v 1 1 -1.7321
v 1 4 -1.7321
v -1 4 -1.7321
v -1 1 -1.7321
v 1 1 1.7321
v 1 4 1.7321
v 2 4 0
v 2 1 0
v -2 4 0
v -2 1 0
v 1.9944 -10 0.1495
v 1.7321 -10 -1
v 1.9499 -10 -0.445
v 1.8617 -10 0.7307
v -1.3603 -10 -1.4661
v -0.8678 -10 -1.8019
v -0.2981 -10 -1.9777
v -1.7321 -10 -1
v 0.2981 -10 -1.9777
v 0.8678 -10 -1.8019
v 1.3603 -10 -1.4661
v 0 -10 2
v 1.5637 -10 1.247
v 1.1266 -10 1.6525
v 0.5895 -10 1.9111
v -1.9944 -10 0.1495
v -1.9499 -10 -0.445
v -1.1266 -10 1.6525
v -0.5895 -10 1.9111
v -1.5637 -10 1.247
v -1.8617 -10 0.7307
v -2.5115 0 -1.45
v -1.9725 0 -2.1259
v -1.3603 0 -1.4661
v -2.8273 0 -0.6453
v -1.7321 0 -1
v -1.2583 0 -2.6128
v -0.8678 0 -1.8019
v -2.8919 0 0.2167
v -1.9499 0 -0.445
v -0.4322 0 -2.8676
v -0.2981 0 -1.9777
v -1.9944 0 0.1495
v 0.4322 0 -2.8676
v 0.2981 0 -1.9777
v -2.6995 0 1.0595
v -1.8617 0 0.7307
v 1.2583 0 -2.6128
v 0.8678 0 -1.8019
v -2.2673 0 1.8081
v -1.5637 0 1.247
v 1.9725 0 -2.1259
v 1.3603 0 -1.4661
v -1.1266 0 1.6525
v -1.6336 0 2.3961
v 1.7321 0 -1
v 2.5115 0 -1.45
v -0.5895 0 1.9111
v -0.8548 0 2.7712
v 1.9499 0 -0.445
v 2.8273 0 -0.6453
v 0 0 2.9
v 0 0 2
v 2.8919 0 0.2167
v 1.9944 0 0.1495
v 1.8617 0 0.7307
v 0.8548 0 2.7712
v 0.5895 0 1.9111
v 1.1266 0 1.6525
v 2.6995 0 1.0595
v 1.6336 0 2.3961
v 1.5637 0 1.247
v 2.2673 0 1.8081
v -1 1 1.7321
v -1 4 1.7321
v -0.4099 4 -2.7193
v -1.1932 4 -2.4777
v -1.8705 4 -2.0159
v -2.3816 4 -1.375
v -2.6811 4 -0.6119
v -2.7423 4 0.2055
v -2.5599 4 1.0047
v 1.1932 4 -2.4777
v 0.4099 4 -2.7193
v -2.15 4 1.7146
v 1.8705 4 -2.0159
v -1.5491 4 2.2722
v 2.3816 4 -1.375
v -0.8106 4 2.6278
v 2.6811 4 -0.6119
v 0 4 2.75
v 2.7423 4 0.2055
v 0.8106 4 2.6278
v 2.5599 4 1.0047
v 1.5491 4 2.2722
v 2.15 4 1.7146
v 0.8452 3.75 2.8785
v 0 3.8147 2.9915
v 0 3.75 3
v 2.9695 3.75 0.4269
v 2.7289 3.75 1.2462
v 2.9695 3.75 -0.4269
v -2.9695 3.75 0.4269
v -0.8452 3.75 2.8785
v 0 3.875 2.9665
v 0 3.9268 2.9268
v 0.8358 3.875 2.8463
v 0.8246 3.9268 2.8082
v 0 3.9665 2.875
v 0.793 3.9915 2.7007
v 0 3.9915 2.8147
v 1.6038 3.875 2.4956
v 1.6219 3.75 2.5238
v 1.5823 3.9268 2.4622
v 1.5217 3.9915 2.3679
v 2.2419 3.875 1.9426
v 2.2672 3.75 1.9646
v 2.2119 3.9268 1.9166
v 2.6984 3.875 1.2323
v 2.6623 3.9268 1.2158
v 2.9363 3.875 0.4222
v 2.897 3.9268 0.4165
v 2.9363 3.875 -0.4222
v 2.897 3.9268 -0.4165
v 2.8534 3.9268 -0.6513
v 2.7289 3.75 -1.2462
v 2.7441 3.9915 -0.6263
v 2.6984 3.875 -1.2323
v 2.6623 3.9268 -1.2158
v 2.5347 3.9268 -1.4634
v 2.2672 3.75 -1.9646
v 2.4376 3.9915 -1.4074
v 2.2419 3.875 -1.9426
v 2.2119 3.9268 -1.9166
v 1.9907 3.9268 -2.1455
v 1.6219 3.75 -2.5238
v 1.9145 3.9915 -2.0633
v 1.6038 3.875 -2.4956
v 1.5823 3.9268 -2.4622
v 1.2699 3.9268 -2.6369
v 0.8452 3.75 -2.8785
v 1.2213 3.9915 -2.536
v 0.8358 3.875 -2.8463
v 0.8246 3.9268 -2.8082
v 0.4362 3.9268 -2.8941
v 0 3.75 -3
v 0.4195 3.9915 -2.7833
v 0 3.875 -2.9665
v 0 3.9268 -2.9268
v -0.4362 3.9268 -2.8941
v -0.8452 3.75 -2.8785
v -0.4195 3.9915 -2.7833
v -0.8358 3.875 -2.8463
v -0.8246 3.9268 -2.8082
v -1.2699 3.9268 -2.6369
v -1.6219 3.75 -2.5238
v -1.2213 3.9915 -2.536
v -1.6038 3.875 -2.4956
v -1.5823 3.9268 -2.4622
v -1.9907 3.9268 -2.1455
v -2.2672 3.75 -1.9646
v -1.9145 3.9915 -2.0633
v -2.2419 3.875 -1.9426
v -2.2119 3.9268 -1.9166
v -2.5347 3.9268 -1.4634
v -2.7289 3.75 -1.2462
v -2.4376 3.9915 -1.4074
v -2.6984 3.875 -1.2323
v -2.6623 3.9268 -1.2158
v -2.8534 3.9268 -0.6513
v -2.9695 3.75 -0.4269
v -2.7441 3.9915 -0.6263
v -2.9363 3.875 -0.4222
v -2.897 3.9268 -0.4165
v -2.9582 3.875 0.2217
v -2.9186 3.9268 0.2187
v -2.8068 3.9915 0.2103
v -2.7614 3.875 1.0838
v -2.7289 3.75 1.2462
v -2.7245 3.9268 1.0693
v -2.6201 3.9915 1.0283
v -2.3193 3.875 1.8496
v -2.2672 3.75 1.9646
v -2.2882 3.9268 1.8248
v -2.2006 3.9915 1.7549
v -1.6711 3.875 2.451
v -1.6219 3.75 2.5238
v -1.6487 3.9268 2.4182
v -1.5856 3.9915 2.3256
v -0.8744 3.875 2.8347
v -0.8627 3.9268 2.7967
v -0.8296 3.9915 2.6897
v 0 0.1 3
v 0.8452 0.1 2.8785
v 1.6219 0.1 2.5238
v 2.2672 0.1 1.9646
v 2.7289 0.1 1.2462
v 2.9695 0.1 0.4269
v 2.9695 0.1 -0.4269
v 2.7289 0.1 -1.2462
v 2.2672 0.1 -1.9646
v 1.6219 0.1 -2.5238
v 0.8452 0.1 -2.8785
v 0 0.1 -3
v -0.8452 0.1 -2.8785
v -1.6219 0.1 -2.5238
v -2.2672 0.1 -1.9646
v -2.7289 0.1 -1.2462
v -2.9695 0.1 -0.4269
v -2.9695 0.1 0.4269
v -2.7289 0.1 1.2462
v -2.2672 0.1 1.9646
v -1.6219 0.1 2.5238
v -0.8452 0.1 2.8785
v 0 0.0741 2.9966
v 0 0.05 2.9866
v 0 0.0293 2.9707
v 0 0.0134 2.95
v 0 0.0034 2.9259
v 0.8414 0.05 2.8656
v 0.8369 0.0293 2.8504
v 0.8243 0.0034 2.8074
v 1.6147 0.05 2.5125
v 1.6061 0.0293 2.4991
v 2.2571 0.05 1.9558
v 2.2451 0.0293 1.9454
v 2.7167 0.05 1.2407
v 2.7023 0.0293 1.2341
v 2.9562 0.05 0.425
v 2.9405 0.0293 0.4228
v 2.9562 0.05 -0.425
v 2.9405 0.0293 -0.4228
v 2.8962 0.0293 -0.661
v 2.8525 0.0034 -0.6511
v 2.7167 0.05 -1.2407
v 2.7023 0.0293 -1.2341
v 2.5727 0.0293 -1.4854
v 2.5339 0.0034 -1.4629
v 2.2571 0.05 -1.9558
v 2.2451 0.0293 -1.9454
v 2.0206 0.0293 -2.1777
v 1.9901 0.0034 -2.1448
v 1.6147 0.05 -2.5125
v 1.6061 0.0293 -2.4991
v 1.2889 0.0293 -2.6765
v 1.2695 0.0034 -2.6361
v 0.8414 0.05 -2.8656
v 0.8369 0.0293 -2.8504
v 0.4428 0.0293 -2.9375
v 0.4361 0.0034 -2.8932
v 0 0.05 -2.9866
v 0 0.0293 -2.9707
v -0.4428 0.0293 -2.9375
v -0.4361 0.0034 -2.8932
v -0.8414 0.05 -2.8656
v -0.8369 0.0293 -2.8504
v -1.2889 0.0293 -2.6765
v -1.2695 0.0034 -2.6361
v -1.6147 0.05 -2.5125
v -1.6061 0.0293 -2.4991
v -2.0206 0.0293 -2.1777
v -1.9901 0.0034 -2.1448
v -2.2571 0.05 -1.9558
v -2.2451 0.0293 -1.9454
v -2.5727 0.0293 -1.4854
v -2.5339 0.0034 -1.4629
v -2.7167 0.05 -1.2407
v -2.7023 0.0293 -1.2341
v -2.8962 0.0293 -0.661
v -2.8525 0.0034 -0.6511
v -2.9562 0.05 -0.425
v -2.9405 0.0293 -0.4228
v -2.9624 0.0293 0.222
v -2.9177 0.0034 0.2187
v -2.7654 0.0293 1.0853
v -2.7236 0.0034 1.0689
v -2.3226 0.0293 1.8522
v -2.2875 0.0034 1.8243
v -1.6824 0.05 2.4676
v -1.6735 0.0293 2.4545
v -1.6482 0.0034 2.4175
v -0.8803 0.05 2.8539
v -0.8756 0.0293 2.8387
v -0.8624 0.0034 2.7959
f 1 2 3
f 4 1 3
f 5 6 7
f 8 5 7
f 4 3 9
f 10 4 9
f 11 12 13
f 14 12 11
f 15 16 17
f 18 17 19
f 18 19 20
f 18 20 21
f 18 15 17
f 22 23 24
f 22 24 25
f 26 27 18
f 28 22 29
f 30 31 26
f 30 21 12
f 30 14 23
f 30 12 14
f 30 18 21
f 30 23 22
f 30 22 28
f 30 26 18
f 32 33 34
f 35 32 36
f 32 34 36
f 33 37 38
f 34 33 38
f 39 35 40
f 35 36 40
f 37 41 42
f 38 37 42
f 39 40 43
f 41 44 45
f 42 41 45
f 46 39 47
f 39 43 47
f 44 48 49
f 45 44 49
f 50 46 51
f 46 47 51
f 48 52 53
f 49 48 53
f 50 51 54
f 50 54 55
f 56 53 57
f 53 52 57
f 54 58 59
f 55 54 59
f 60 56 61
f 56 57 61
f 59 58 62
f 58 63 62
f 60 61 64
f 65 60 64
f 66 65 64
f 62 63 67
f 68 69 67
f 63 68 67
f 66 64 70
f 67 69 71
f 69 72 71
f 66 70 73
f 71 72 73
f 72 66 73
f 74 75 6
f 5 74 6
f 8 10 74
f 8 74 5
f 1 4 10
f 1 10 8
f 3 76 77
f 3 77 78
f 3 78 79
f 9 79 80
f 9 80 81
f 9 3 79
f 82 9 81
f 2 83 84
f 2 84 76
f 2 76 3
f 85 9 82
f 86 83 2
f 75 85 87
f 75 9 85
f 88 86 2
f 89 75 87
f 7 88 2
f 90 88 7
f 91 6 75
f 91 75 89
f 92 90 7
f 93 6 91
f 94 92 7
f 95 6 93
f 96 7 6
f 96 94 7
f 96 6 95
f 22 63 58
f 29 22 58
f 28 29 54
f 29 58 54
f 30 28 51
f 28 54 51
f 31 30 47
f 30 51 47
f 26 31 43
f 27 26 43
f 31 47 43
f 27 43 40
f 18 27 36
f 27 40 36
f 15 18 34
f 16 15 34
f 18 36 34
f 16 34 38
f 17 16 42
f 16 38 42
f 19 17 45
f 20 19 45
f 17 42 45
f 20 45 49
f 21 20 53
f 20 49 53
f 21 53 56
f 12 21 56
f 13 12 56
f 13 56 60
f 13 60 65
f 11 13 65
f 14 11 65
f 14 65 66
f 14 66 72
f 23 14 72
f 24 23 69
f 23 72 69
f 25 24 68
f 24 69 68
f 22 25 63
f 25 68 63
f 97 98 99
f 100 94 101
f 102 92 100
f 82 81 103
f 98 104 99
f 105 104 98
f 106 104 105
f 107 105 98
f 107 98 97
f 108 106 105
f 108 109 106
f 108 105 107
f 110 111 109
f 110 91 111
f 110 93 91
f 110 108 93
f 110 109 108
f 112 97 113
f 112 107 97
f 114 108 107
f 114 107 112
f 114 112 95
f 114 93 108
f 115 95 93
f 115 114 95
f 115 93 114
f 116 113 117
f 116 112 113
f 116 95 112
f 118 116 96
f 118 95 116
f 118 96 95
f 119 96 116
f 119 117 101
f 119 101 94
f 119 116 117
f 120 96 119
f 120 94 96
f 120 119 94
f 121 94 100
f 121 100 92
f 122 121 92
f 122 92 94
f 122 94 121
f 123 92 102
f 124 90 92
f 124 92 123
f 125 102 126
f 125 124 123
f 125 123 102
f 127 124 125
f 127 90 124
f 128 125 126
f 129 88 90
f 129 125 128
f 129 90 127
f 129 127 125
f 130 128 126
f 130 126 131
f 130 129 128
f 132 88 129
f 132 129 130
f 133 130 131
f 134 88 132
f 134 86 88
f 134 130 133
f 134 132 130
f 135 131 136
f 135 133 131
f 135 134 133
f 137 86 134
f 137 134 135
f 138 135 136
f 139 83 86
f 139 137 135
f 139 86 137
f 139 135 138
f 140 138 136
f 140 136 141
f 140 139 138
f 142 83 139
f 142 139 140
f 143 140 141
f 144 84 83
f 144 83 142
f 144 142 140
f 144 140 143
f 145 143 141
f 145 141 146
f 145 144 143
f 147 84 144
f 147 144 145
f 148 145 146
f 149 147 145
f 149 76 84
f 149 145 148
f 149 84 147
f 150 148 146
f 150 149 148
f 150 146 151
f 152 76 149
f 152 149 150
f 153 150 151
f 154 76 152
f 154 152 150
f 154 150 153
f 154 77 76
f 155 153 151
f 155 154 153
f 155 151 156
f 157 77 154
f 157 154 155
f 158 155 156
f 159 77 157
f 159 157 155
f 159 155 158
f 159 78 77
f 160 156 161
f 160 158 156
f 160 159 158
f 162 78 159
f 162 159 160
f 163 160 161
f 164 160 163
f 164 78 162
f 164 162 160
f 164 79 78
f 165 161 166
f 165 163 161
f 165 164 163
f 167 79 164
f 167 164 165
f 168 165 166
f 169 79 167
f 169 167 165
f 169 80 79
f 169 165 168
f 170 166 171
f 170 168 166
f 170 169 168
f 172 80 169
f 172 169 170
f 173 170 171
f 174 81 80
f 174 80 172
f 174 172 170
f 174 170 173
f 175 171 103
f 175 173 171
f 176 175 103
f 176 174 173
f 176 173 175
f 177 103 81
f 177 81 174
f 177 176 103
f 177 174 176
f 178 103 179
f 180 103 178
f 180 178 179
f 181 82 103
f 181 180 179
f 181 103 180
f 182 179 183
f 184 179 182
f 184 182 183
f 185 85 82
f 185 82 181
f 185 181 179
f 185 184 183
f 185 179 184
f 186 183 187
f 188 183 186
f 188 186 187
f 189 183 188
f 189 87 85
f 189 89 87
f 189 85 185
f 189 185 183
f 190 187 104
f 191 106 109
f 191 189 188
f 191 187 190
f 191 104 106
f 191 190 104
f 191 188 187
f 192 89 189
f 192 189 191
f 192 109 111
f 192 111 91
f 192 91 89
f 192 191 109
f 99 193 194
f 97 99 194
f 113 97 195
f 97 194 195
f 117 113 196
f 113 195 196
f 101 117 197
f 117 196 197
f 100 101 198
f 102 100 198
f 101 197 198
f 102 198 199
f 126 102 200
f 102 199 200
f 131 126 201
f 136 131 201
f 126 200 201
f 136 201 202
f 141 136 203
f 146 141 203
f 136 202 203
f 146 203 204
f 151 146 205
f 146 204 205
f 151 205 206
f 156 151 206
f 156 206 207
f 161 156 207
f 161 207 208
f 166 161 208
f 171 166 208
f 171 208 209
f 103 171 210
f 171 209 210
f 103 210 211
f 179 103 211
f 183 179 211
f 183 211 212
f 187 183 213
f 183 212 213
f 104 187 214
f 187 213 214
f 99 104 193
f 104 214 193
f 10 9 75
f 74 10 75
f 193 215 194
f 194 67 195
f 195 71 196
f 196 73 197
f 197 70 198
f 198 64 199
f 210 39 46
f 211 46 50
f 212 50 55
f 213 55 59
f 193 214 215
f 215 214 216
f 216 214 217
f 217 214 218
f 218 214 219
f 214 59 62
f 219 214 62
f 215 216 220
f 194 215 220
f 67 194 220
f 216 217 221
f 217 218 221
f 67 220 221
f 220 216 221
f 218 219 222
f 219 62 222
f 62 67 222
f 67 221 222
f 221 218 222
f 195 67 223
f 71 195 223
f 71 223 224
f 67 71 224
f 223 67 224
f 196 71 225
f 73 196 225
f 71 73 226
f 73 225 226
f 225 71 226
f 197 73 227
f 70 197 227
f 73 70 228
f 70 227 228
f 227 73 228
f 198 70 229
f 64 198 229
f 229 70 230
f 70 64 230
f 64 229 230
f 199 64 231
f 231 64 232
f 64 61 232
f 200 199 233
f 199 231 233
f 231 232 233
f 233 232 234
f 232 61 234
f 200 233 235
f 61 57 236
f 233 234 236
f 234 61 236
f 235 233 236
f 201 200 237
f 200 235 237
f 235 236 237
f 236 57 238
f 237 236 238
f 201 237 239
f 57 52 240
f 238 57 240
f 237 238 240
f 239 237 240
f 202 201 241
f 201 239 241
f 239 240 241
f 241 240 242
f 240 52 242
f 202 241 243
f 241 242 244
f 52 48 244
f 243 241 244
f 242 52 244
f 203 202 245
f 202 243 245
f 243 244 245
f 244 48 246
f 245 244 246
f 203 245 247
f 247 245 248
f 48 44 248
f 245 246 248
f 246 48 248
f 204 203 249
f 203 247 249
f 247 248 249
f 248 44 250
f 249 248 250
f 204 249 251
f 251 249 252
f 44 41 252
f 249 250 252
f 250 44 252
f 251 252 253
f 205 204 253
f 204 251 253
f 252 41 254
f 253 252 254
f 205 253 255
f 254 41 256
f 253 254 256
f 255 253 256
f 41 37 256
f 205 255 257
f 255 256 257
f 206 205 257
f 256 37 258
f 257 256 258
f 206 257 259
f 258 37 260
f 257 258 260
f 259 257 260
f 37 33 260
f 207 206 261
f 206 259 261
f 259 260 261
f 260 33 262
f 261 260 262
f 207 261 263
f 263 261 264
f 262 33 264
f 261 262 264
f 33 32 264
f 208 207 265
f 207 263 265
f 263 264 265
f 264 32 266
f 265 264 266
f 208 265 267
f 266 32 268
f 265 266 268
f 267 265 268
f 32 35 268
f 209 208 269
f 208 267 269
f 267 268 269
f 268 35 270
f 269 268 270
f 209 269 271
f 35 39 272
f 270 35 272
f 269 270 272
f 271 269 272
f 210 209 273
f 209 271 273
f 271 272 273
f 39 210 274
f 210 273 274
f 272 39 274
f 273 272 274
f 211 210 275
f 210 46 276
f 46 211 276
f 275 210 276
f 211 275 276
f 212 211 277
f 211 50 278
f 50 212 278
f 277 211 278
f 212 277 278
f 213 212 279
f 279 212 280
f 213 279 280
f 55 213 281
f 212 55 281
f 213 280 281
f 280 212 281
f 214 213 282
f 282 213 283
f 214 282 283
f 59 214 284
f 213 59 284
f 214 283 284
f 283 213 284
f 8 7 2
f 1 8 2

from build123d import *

# Parameters (mm, degrees)
SKETCH1_R           = 3
BOSS_EXTRUDE1_DEPTH = 4
FILLET1_R           = 0.25
CUT_EXTRUDE1_DEPTH  = 3
FILLET2_R           = 0.1
SKETCH3_R           = 2
BOSS_EXTRUDE2_DEPTH = 10


with BuildPart() as part:
    # Sketch1 → Boss-Extrude1 (new body)
    with BuildSketch(Plane(origin=(0, 0, 0), x_dir=(1, 0, 0), z_dir=(0, 1, 0))):
        with Locations(Location((0, 0, 0), (0, 0, 270))):
            Circle(SKETCH1_R)
    extrude(amount=BOSS_EXTRUDE1_DEPTH)

    # Fillet1
    fillet1_edges = [part.edges().sort_by_distance(p)[0] for p in [
        (0, 4, -3),
    ]]
    fillet(fillet1_edges, radius=FILLET1_R)

    # Sketch2 → Cut-Extrude1 (cut)
    with BuildSketch(Plane(origin=(0, 4, 0), x_dir=(1, 0, 0), z_dir=(0, 1, 0))):
        Polygon((2, 0), (1, 1.732050808), (-1, 1.732050808), (-2, 0), (-1, -1.732050808), (1, -1.732050808), align=None)
    extrude(amount=-CUT_EXTRUDE1_DEPTH, mode=Mode.SUBTRACT)

    # Fillet2
    fillet2_edges = [part.edges().sort_by_distance(p)[0] for p in [
        (0, 0, -3),
    ]]
    fillet(fillet2_edges, radius=FILLET2_R)

    # Sketch3 → Boss-Extrude2 (add)
    with BuildSketch(Plane.XZ):
        with Locations(Location((0, 0, 0), (0, 0, 90))):
            Circle(SKETCH3_R)
    extrude(amount=BOSS_EXTRUDE2_DEPTH)


solid = part.part
